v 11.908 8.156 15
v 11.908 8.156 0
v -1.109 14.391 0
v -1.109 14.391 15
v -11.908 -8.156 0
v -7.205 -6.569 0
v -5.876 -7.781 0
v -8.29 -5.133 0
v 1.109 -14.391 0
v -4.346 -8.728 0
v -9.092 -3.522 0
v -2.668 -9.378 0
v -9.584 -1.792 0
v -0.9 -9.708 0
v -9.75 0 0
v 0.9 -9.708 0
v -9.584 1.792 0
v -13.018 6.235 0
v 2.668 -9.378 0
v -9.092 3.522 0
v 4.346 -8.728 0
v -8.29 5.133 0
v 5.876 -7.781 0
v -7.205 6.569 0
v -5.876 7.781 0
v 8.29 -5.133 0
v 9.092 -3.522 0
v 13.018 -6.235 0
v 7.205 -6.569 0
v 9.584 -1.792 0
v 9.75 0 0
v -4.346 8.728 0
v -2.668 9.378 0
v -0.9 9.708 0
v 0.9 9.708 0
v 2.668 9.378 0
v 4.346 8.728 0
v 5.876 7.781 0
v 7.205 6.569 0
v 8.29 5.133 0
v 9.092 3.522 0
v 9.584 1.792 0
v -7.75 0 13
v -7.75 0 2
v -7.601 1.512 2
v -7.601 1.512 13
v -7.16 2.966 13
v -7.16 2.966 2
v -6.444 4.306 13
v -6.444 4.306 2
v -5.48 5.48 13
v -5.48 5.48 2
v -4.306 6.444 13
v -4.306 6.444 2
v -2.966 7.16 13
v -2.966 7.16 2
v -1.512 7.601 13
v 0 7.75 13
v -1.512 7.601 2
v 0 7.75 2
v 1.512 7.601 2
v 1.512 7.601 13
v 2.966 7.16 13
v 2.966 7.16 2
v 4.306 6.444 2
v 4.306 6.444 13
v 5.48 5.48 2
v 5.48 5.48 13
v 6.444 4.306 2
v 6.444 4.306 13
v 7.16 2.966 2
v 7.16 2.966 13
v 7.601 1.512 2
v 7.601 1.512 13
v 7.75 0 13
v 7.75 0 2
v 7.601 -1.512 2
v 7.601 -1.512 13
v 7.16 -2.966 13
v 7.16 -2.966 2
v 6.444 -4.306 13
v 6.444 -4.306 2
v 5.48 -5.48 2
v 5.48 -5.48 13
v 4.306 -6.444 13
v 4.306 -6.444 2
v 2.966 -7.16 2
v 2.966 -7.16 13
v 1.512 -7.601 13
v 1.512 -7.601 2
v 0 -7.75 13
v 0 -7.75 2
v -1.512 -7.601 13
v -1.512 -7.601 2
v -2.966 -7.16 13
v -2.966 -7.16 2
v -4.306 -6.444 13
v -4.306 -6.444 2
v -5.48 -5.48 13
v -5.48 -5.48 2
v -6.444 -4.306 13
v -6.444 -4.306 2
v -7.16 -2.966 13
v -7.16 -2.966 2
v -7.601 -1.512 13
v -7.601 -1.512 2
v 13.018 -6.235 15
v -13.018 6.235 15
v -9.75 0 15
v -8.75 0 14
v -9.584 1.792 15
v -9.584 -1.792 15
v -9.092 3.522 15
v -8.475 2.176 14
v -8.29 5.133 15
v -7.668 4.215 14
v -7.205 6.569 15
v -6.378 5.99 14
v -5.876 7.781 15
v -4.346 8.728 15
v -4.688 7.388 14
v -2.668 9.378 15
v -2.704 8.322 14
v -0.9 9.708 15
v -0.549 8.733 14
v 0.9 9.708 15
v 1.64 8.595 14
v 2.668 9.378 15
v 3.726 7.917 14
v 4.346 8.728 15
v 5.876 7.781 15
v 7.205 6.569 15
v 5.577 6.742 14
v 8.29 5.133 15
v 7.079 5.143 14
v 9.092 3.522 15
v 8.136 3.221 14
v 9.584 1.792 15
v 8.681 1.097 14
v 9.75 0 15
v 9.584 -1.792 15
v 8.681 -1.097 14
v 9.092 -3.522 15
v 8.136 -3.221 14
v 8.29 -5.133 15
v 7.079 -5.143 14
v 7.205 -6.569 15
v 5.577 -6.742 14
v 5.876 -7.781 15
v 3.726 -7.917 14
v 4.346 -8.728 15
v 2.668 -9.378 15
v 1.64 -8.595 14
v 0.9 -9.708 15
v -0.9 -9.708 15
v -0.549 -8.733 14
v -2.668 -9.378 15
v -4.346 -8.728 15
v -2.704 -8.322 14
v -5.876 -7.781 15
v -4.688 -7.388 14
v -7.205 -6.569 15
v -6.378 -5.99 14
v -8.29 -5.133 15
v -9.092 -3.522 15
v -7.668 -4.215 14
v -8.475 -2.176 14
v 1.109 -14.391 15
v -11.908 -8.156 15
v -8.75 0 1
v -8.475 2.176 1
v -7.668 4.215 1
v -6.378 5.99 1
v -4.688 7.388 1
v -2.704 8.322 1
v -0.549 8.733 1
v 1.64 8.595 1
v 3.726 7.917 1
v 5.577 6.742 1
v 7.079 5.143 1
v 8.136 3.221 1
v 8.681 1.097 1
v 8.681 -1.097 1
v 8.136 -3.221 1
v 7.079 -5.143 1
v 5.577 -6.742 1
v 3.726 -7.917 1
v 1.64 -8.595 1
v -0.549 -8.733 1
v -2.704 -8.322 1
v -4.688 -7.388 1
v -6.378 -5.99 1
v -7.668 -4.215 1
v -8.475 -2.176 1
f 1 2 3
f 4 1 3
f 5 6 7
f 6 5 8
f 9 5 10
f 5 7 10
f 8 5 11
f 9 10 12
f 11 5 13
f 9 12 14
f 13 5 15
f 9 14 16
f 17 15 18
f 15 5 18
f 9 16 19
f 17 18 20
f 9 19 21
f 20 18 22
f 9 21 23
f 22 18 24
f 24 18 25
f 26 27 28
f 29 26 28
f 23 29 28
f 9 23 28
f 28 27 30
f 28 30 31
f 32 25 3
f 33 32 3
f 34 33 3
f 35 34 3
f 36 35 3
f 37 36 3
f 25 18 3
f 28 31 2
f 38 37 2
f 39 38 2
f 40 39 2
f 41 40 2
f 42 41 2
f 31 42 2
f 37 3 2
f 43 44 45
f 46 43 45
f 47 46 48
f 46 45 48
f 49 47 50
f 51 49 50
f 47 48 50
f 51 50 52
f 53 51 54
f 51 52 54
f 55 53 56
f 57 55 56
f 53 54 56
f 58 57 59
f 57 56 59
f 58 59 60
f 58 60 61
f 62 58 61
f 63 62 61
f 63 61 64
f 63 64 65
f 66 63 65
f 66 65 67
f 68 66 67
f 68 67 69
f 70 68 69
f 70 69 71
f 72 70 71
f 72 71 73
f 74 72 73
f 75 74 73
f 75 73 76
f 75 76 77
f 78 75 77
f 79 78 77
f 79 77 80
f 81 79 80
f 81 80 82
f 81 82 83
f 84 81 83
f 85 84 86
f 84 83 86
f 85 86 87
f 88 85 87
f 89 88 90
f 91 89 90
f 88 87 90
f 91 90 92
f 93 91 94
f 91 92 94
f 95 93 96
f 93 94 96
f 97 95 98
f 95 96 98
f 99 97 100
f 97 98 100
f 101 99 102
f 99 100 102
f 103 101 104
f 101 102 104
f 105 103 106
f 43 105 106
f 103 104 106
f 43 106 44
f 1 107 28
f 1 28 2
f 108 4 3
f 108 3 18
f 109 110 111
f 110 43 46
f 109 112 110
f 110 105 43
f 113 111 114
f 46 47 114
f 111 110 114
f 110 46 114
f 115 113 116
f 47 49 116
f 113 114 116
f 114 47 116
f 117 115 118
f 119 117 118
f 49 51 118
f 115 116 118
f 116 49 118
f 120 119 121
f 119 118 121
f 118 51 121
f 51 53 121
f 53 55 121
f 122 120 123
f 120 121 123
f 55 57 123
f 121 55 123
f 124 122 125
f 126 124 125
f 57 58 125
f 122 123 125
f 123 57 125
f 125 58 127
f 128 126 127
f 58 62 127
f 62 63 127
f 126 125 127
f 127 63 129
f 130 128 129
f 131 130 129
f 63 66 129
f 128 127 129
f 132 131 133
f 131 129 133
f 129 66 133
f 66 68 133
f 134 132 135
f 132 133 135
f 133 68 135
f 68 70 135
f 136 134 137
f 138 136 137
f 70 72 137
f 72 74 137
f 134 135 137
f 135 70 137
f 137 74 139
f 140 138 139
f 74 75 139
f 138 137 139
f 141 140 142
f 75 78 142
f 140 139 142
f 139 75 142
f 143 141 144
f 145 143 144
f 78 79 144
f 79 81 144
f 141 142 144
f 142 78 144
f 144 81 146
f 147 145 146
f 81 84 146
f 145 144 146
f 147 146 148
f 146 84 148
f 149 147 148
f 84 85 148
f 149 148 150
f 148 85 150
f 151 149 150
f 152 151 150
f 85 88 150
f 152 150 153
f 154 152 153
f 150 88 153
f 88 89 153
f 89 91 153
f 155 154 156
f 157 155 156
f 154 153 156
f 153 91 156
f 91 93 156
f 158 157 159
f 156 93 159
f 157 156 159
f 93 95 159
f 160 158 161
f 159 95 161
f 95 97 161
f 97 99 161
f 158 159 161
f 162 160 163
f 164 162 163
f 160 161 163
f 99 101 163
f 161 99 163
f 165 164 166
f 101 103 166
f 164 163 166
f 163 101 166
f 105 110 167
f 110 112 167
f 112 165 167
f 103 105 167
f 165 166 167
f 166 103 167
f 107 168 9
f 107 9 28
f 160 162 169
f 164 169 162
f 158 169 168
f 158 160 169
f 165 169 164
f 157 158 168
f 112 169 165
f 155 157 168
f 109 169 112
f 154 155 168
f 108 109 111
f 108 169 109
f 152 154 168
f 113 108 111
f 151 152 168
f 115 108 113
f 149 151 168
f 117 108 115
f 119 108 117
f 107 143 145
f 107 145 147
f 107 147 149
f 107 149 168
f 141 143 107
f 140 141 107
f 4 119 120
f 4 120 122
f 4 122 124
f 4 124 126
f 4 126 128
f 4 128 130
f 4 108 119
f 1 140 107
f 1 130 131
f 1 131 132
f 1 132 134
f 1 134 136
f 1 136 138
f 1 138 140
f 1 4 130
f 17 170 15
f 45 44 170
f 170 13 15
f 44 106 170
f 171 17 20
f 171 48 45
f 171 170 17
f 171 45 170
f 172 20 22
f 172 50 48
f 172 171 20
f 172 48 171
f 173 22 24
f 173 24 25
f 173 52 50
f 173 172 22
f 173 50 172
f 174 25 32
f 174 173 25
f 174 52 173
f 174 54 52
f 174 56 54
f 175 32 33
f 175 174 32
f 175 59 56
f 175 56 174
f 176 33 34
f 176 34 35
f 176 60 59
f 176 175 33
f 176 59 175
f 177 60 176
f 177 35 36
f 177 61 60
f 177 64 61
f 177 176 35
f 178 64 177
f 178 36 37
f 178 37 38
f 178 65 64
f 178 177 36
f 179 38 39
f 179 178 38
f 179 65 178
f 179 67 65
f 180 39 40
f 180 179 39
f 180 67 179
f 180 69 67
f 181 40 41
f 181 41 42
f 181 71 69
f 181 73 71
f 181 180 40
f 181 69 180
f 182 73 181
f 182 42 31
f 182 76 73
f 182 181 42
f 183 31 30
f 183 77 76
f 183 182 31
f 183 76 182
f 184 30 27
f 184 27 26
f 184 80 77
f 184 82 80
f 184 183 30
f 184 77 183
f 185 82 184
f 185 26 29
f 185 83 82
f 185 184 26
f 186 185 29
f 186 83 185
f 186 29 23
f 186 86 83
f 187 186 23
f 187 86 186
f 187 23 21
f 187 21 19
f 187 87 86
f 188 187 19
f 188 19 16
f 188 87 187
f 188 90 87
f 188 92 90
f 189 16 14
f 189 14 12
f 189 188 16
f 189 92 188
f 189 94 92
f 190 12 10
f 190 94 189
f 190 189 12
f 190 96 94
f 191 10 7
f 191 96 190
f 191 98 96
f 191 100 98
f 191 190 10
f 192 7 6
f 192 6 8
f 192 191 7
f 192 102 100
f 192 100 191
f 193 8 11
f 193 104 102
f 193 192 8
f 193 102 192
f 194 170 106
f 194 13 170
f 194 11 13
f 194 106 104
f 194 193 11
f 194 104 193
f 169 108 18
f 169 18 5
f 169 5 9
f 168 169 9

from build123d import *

# Parameters (mm, degrees)
BOSS_EXTRUDE1_DEPTH = 15
SKETCH2_R           = 7.75
CUT_EXTRUDE1_DEPTH  = 25.526787522
CHAMFER1_SIZE       = 2


with BuildPart() as part:
    # Sketch1 → Boss-Extrude1 (new body)
    with BuildSketch(Plane.XY):
        Polygon((13.017705446, -6.234795766), (11.908344244, 8.156265732), (-1.109361202, 14.391061499), (-13.017705446, 6.234795766), (-11.908344244, -8.156265732), (1.109361202, -14.391061499), align=None)
    extrude(amount=BOSS_EXTRUDE1_DEPTH)

    # Sketch2 → Cut-Extrude1 (cut, through all)
    with BuildSketch(Plane(origin=(0, 0, 0), x_dir=(-1, 0, 0), z_dir=(0, 0, -1))):
        Circle(SKETCH2_R)
    extrude(amount=-CUT_EXTRUDE1_DEPTH, mode=Mode.SUBTRACT)

    # Chamfer1
    chamfer1_edges = [part.edges().sort_by_distance(p)[0] for p in [
        (7.75, 0, 15),
        (7.75, 0, 0),
    ]]
    chamfer(chamfer1_edges, length=CHAMFER1_SIZE)


solid = part.part
